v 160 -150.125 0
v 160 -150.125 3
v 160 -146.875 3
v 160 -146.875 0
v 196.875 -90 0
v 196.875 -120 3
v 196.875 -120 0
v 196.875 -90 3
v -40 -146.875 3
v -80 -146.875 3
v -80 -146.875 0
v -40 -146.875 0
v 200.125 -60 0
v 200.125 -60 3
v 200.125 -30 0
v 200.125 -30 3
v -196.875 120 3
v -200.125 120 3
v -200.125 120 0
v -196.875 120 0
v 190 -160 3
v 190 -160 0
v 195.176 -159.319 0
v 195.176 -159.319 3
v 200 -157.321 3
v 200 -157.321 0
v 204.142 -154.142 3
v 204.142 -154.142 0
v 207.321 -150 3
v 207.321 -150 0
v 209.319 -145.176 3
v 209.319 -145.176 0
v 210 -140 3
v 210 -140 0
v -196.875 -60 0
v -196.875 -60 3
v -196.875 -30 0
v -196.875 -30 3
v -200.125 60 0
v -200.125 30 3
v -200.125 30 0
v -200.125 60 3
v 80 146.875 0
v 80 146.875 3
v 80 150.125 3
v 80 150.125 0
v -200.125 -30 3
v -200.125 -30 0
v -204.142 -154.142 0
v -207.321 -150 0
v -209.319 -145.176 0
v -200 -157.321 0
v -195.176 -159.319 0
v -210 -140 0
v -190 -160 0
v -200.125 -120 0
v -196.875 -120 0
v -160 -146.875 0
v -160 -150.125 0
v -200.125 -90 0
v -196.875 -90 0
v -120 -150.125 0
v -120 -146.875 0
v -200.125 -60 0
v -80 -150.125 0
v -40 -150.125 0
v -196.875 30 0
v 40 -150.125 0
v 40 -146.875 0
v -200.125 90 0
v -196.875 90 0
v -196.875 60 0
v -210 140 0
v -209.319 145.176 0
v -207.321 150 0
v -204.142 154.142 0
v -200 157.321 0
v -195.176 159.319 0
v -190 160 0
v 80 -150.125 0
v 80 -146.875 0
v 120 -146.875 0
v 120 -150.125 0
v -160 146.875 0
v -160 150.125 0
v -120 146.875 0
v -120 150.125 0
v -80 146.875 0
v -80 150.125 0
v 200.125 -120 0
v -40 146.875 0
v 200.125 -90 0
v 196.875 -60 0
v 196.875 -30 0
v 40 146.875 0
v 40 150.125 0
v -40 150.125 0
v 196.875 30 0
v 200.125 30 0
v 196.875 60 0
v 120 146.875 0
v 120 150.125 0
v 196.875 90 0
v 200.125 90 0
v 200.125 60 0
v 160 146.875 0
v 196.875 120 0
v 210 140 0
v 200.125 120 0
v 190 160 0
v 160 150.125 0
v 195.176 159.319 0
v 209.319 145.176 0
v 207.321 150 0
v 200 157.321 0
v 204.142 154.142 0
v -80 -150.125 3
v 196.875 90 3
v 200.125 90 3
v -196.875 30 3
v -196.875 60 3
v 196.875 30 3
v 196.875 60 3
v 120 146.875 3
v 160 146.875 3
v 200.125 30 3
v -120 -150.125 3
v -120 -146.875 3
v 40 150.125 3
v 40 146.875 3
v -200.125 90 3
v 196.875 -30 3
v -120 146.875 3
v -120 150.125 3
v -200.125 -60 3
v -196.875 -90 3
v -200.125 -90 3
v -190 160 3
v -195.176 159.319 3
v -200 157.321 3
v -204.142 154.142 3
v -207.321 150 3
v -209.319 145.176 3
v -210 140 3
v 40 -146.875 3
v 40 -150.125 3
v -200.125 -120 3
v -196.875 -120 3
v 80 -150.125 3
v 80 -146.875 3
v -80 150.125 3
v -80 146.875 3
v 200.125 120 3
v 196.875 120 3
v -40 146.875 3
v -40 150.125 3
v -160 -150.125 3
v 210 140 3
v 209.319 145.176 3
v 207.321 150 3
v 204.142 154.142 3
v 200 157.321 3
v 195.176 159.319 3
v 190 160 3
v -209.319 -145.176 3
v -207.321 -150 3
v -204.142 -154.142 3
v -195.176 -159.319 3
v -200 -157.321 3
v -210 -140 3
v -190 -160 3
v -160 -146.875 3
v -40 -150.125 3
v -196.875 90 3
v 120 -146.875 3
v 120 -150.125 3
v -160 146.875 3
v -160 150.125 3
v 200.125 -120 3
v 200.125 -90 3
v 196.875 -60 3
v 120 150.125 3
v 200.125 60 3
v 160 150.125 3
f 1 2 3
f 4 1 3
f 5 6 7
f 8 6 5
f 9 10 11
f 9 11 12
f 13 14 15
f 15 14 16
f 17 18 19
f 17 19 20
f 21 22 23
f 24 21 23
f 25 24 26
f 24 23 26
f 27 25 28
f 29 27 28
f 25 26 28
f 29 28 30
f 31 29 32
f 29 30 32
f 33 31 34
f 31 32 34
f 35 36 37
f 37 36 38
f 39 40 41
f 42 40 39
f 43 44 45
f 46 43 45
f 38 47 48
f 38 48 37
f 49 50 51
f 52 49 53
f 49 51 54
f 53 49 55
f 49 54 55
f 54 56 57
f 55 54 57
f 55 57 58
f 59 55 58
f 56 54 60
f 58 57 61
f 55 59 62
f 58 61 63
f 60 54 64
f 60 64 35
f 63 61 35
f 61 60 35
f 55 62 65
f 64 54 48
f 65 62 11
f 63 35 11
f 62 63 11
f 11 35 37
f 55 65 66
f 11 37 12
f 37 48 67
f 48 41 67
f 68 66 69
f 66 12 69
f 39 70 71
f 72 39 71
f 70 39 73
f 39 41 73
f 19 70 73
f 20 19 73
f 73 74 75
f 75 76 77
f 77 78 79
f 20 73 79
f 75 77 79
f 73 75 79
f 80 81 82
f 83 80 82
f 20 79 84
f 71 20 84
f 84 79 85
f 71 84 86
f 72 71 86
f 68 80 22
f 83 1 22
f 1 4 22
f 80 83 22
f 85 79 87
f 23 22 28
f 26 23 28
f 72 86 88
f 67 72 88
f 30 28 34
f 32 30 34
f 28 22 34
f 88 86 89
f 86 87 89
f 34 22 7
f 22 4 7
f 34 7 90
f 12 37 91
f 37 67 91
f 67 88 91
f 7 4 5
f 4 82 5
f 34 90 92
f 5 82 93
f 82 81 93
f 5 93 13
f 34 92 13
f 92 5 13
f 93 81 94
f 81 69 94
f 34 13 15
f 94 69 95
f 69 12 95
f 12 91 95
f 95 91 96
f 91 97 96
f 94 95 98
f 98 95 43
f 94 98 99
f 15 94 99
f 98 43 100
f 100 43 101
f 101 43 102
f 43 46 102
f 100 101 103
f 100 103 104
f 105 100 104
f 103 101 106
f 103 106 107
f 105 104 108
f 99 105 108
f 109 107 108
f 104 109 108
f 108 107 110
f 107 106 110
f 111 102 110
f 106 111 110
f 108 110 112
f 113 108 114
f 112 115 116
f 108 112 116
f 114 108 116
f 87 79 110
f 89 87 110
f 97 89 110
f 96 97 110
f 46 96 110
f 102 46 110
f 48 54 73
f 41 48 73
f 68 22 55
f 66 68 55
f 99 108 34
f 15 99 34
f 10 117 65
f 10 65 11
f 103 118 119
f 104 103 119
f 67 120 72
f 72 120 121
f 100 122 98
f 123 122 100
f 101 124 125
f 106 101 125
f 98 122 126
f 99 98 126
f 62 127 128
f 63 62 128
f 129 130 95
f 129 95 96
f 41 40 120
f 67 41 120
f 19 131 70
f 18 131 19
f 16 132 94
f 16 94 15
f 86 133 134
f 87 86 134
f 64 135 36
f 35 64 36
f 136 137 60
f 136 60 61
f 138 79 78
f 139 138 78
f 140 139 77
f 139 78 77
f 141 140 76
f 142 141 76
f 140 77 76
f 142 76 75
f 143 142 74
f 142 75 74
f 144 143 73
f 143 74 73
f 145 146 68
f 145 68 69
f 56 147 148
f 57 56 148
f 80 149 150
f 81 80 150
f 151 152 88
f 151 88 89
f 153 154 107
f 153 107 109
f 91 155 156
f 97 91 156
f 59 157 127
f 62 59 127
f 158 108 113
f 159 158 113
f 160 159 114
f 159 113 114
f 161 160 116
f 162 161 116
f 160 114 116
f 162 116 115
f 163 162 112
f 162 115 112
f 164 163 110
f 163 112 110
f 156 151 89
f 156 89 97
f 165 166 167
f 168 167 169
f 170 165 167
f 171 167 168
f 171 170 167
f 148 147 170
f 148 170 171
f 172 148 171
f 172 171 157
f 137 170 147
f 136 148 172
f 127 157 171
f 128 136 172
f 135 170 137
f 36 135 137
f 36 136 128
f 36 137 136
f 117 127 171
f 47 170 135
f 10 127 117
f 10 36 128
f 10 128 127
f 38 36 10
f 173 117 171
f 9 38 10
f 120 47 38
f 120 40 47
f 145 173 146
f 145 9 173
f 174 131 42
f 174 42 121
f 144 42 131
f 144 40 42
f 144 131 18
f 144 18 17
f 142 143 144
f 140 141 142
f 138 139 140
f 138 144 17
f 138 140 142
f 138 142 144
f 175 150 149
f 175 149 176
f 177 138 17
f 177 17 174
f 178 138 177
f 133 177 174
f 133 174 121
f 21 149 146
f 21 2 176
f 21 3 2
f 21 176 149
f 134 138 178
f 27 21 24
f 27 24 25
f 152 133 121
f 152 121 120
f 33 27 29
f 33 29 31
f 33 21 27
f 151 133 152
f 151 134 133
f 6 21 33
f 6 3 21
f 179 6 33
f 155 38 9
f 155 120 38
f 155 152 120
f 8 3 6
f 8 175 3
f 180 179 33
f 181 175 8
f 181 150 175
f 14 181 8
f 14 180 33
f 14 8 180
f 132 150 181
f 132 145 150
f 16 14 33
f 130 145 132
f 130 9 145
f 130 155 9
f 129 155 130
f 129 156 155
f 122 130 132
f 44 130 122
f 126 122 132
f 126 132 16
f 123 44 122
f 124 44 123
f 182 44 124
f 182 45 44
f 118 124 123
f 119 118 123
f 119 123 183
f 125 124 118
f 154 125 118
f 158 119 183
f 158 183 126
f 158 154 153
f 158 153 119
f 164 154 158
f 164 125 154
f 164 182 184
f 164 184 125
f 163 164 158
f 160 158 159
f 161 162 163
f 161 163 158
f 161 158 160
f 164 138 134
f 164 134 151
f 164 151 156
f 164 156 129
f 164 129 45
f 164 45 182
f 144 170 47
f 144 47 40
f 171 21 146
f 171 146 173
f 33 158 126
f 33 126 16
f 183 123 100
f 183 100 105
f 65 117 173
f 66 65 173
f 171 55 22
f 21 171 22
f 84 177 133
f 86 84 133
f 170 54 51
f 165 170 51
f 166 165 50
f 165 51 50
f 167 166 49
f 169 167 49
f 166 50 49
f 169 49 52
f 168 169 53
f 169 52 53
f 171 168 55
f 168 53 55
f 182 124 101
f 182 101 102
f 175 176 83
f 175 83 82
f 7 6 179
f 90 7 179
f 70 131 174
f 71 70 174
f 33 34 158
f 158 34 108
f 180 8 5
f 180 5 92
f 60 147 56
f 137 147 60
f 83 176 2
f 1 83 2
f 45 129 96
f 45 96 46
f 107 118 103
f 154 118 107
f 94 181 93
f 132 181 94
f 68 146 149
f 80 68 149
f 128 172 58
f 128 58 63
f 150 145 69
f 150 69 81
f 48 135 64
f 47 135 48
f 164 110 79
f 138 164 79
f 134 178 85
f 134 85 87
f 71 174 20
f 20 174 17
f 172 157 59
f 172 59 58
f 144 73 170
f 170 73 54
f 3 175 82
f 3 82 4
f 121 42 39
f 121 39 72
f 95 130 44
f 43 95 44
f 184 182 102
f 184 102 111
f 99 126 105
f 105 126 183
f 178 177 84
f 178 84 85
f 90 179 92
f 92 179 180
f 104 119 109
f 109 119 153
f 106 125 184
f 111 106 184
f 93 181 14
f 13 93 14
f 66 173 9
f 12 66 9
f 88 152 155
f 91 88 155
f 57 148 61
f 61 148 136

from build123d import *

# Parameters (mm, degrees)
F1_DEPTH = 3
F2_W     = 40
F2_H     = 3.25
F2_W_2   = 3.25
F2_H_2   = 30
F3_DEPTH = 3


with BuildPart() as f1:
    # F0 (on Top) → F1 (new body)
    with BuildSketch(Plane.XY):
        with BuildLine():
            Line((190, 160), (-190, 160))
            ThreePointArc((-190, 160), (-204.142136, 154.142136), (-210, 140))
            Line((-210, 140), (-210, -140))
            ThreePointArc((-210, -140), (-204.142136, -154.142136), (-190, -160))
            Line((-190, -160), (190, -160))
            ThreePointArc((190, -160), (204.142136, -154.142136), (210, -140))
            Line((210, -140), (210, 140))
            ThreePointArc((210, 140), (204.142136, 154.142136), (190, 160))
        make_face()
    extrude(amount=F1_DEPTH)

    # F2 (on face) → F3 (cut)
    with BuildSketch(Plane.XY.offset(3)):
        with Locations((-140, 148.5)):
            Rectangle(F2_W, F2_H)
        with Locations((-60, 148.5)):
            Rectangle(F2_W, F2_H)
        with Locations((60, 148.5)):
            Rectangle(F2_W, F2_H)
        with Locations((140, 148.5)):
            Rectangle(F2_W, F2_H)
        with Locations((198.5, 105)):
            Rectangle(F2_W_2, F2_H_2)
        with Locations((198.5, 45)):
            Rectangle(F2_W_2, F2_H_2)
        with Locations((198.5, -45)):
            Rectangle(F2_W_2, F2_H_2)
        with Locations((-198.5, 105)):
            Rectangle(F2_W_2, F2_H_2)
        with Locations((-198.5, 45)):
            Rectangle(F2_W_2, F2_H_2)
        with Locations((-198.5, -45)):
            Rectangle(F2_W_2, F2_H_2)
        with Locations((-198.5, -105)):
            Rectangle(F2_W_2, F2_H_2)
        with Locations((-140, -148.5)):
            Rectangle(F2_W, F2_H)
        with Locations((-60, -148.5)):
            Rectangle(F2_W, F2_H)
        with Locations((60, -148.5)):
            Rectangle(F2_W, F2_H)
        with Locations((140, -148.5)):
            Rectangle(F2_W, F2_H)
        with Locations((198.5, -105)):
            Rectangle(F2_W_2, F2_H_2)
    extrude(amount=-F3_DEPTH, mode=Mode.SUBTRACT)


solid = f1.part
